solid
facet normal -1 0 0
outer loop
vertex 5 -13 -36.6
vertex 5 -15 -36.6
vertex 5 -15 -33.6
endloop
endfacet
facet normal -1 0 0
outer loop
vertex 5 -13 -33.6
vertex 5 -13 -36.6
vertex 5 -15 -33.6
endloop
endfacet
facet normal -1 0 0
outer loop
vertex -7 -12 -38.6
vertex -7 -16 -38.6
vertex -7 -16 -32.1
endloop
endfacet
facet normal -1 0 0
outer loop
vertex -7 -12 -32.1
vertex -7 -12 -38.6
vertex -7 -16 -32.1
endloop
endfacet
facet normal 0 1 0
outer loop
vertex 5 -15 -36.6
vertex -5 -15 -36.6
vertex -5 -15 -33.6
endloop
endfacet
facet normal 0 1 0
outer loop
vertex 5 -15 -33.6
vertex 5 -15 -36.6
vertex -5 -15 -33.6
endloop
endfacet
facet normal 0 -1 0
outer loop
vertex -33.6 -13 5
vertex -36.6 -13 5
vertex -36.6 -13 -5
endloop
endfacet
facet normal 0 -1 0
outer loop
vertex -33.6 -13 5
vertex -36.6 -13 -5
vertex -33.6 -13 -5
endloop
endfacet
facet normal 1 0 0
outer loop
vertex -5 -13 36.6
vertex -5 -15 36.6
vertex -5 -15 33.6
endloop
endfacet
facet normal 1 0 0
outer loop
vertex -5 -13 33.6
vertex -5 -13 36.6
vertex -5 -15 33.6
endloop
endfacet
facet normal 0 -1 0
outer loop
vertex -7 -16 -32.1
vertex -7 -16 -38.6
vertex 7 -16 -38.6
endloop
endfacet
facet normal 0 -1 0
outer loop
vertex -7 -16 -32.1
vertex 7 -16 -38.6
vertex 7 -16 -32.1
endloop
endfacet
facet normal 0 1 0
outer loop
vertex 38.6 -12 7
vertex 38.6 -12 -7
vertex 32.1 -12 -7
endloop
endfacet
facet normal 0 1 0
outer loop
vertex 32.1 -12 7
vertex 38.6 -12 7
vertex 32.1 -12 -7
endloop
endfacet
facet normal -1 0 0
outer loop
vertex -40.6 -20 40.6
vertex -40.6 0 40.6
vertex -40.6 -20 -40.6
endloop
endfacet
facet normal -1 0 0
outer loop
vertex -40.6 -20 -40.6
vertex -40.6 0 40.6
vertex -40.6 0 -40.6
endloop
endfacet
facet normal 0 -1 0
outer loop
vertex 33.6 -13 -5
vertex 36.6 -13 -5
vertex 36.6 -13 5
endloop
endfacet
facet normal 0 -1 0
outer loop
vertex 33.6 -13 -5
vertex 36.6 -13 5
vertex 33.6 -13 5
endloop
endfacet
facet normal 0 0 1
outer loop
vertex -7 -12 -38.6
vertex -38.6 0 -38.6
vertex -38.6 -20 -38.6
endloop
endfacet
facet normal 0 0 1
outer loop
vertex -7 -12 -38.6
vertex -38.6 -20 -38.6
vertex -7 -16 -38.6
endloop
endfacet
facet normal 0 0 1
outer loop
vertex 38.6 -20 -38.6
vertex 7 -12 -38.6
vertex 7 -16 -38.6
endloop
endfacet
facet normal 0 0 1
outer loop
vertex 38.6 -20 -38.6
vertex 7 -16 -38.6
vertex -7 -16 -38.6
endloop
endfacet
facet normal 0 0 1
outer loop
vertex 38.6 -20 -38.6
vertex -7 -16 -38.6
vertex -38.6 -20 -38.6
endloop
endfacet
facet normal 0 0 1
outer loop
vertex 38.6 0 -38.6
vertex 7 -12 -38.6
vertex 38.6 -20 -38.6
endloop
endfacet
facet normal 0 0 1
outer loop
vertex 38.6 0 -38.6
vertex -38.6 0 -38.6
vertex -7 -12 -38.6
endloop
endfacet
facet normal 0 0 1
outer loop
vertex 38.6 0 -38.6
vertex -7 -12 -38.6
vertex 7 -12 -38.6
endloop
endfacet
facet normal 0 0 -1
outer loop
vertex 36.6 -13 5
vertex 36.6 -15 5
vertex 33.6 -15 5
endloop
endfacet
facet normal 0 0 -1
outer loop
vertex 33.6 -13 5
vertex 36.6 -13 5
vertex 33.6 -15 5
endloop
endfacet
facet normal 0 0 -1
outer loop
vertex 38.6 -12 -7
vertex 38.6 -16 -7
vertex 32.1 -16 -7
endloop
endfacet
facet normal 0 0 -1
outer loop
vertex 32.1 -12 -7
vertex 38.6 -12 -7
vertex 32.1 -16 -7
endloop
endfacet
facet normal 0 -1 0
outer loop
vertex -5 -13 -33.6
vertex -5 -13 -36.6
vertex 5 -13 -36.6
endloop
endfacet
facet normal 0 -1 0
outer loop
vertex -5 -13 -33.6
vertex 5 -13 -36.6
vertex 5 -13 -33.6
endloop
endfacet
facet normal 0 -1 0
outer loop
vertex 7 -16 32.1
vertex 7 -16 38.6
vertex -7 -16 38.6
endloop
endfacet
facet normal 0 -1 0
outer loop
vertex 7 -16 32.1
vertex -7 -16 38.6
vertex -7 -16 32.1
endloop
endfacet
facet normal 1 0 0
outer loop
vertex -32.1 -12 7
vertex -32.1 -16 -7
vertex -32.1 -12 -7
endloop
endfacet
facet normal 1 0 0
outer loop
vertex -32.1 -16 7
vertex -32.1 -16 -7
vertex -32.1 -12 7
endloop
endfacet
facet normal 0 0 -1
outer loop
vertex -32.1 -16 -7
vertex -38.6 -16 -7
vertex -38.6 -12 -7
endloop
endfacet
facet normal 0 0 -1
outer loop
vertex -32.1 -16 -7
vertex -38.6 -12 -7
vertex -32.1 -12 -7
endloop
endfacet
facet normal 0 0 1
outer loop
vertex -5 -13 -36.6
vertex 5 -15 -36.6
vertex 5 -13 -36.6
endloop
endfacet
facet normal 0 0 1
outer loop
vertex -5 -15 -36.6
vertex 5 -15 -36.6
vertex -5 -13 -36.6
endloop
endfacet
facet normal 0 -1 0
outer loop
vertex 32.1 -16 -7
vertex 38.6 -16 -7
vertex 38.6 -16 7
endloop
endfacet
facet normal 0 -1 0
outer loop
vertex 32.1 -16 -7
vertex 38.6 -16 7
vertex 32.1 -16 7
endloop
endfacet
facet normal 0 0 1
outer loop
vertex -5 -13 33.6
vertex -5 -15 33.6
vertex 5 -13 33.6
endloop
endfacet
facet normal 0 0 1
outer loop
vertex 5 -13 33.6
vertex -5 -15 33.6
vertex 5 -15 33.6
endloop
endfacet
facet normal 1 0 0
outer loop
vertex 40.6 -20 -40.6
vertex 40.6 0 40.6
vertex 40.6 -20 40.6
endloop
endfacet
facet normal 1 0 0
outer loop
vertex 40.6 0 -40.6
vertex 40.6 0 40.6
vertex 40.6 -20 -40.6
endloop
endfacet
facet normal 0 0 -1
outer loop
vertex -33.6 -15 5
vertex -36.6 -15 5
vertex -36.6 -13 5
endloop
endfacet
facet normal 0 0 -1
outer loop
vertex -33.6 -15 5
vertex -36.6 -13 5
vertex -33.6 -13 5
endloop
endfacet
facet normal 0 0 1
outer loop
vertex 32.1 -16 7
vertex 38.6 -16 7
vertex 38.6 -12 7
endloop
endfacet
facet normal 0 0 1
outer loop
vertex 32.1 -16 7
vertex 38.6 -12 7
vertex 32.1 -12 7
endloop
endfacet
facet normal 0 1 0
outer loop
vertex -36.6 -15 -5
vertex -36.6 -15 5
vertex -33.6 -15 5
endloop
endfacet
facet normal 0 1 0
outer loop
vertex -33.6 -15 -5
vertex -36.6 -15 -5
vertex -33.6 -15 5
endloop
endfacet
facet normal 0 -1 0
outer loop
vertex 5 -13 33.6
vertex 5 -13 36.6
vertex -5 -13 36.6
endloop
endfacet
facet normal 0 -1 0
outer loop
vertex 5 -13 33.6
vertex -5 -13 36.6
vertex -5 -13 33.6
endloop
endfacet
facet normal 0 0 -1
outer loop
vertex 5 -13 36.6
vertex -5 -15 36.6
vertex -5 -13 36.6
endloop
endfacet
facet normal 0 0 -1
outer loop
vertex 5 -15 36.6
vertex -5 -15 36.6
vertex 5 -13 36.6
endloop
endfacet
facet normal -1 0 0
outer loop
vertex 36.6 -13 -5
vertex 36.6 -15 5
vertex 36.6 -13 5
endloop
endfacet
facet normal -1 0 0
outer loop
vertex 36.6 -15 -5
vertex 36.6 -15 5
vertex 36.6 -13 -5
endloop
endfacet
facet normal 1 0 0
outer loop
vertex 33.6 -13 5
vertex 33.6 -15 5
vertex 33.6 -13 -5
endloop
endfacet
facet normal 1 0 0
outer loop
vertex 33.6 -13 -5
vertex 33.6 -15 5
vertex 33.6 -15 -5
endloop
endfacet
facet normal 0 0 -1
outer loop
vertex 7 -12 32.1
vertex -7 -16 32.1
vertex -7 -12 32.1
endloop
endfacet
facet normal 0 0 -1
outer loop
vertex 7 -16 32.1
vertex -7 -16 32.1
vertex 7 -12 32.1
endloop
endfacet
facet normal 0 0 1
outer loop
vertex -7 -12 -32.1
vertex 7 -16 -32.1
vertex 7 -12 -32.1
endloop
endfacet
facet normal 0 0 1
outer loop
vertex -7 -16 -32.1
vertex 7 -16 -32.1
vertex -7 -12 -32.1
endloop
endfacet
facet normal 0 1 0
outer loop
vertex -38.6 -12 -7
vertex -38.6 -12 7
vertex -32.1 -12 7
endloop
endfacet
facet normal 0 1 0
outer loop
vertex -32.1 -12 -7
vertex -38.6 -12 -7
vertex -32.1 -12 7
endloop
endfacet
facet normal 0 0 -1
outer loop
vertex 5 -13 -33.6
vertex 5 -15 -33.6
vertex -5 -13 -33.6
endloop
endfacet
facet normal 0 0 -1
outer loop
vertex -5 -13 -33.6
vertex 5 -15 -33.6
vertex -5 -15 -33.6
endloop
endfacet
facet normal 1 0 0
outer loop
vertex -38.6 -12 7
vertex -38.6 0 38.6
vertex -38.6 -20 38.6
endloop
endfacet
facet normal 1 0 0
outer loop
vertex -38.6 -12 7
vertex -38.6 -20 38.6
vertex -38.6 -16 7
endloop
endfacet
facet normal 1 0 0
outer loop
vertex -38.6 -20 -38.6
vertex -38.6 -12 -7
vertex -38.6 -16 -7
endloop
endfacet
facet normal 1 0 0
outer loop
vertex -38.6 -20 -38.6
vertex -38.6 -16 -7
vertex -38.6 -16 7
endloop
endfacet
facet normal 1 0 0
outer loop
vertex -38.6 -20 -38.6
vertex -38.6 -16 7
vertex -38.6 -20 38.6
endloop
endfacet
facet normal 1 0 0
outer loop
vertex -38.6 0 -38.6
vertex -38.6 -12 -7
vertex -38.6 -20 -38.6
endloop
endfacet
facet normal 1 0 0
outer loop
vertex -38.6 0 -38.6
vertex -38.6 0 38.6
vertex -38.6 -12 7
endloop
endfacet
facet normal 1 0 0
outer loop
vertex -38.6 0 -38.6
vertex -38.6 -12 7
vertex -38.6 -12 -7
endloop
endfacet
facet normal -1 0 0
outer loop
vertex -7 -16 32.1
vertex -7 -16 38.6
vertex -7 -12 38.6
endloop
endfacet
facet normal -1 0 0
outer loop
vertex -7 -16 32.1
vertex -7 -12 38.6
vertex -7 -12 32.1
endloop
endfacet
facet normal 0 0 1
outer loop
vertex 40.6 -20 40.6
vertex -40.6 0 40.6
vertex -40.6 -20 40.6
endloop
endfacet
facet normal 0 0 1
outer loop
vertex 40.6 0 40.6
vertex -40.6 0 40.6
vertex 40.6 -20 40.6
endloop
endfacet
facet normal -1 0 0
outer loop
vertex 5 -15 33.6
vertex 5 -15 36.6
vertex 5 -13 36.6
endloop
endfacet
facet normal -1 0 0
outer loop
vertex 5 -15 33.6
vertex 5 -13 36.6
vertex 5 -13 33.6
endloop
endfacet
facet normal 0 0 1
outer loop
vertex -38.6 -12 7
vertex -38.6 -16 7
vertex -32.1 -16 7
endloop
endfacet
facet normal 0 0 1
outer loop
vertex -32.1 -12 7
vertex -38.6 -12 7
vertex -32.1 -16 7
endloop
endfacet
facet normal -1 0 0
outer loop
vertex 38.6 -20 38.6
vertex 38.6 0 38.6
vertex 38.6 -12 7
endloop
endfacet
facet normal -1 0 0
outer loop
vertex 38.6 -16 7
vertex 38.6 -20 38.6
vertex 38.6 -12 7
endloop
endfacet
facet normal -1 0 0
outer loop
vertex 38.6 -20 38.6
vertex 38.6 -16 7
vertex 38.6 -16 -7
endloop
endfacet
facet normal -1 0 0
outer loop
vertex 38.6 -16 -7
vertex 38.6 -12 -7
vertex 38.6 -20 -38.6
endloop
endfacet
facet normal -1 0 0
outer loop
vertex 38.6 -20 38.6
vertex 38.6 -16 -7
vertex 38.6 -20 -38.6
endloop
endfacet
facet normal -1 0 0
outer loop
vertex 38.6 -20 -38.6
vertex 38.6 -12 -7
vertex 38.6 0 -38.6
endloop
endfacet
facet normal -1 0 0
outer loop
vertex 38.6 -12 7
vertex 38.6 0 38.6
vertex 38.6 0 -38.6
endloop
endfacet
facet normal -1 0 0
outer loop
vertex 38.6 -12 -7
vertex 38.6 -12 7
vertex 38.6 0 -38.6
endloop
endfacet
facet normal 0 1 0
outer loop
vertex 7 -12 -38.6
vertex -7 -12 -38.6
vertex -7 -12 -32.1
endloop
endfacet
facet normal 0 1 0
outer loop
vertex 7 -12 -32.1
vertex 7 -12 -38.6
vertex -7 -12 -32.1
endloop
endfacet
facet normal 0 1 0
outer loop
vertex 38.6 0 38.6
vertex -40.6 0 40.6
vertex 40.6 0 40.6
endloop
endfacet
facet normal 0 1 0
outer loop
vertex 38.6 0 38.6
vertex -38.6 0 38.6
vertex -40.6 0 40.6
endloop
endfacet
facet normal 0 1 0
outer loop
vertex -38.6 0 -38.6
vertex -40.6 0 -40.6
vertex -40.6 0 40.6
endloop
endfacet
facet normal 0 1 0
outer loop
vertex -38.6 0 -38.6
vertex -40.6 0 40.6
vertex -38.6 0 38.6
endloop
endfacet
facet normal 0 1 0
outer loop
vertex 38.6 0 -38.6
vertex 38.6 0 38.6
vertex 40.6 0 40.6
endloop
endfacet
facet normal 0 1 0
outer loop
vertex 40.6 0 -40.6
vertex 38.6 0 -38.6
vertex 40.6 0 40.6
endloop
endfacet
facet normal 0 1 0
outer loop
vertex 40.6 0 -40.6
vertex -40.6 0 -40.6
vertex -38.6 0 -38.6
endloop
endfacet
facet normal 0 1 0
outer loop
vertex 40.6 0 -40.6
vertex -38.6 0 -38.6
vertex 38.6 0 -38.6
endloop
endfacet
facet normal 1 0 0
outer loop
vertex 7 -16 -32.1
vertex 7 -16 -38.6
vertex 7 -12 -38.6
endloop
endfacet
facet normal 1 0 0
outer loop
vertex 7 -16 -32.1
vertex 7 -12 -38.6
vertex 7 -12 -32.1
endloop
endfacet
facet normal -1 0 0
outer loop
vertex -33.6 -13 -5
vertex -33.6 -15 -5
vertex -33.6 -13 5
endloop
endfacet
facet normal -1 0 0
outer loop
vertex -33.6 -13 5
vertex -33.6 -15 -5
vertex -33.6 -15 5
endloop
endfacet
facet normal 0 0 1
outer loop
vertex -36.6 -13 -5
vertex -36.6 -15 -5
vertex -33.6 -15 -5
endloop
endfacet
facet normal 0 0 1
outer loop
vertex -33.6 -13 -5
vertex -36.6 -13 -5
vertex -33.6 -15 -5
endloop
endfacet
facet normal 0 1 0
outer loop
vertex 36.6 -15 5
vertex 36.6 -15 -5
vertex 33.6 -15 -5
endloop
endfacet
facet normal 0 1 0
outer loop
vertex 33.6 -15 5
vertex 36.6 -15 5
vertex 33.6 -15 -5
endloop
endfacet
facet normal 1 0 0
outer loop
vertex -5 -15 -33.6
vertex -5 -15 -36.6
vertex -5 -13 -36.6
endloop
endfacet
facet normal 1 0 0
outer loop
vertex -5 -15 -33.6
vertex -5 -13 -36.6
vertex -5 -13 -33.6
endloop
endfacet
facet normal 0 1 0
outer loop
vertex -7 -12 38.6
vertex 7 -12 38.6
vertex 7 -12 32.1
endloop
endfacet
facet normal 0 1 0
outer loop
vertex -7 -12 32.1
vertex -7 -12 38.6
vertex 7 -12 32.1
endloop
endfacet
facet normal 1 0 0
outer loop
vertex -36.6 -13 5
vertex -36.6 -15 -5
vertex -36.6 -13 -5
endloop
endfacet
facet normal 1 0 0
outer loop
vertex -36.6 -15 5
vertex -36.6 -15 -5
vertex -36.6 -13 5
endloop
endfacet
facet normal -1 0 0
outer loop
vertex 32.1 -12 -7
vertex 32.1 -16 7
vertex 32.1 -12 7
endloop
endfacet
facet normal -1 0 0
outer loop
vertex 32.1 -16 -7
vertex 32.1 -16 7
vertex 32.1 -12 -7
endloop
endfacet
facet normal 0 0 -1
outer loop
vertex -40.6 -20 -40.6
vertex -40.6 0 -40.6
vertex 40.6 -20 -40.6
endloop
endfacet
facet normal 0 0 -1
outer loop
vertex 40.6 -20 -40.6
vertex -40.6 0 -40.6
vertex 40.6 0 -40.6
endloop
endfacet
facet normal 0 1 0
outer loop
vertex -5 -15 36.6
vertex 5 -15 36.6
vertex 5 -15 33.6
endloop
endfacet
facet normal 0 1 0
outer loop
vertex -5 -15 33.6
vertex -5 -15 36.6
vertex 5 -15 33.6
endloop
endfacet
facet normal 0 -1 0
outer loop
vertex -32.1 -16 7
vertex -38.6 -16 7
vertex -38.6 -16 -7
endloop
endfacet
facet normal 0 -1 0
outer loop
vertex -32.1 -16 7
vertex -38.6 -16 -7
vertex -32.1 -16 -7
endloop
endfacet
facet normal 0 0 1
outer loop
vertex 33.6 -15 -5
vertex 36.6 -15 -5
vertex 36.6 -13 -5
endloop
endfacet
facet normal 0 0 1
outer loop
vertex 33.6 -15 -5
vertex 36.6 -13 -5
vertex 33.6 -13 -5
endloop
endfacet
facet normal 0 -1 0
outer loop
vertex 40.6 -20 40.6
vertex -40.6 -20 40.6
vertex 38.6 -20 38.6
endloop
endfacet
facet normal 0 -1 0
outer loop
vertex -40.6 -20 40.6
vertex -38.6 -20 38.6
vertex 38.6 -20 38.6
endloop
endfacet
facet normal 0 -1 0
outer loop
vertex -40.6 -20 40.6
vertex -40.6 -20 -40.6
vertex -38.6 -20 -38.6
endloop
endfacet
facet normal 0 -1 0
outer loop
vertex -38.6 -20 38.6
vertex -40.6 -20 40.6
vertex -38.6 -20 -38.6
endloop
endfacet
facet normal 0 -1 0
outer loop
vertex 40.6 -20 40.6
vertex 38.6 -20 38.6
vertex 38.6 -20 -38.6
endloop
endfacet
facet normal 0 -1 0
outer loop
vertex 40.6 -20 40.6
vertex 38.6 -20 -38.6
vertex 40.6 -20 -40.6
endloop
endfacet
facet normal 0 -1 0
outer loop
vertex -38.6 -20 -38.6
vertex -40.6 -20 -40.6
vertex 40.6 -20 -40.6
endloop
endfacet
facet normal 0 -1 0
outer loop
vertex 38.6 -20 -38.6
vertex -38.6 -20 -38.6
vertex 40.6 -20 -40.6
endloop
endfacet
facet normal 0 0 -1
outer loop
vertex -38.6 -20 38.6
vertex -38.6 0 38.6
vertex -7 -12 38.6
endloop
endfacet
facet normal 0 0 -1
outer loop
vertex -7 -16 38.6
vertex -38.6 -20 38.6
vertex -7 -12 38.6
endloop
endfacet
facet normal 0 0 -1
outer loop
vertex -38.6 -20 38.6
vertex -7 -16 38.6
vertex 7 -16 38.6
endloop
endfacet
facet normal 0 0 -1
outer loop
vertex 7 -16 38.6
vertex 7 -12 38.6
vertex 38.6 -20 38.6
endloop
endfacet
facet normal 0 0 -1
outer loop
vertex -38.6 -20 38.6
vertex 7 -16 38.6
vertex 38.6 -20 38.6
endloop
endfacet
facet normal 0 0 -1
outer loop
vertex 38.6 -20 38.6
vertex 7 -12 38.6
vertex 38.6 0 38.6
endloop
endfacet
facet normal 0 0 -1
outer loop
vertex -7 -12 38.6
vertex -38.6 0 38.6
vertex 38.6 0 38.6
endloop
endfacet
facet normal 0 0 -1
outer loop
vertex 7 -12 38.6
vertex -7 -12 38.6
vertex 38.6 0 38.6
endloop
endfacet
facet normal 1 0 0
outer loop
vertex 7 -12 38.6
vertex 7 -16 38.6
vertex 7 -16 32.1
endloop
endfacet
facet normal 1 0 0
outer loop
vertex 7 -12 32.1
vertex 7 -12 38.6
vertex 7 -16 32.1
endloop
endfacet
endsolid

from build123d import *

# Parameters (mm, degrees)
SKETCH4_W           = 81.2
SKETCH4_H           = 81.2
SKETCH4_W_2         = 77.2
SKETCH4_H_2         = 77.2
BOSS_EXTRUDE1_DEPTH = 20
BOSS_EXTRUDE2_START = -4
SKETCH5_W           = 6.5
SKETCH5_H           = 14
BOSS_EXTRUDE2_DEPTH = 4
CUT_EXTRUDE2_START  = -5
SKETCH5_3_W         = 3
SKETCH5_3_H         = 10
CUT_EXTRUDE2_DEPTH  = 2
CIRPATTERN2_COUNT   = 4


with BuildPart() as part:
    # Sketch4 → Boss-Extrude1 (new body)
    with BuildSketch(Plane(origin=(0, 0, 0), x_dir=(1, 0, 0), z_dir=(0, 1, 0))):
        Rectangle(SKETCH4_W, SKETCH4_H)
        Rectangle(SKETCH4_W_2, SKETCH4_H_2, mode=Mode.SUBTRACT)
    extrude(amount=-BOSS_EXTRUDE1_DEPTH)

    # Sketch5 → Boss-Extrude2 (add)
    with BuildSketch(Plane.XZ.offset(20).offset(BOSS_EXTRUDE2_START)):
        with Locations((-35.35, 0)):
            Rectangle(SKETCH5_W, SKETCH5_H)
    boss_extrude2 = extrude(amount=-BOSS_EXTRUDE2_DEPTH)

    # Sketch5<3> → Cut-Extrude2 (cut)
    with BuildSketch(Plane.XZ.offset(20).offset(CUT_EXTRUDE2_START)):
        with Locations((-35.1, 0)):
            Rectangle(SKETCH5_3_W, SKETCH5_3_H)
    cut_extrude2 = extrude(amount=-CUT_EXTRUDE2_DEPTH, mode=Mode.SUBTRACT)

    # CirPattern2: Boss-Extrude2, Cut-Extrude2 ×4 about axis
    cirpattern2_axis = Axis((0, 0, 0), (0, -1, 0))
    add([boss_extrude2.rotate(cirpattern2_axis, i * 360 / CIRPATTERN2_COUNT) for i in range(1, CIRPATTERN2_COUNT)])
    add([cut_extrude2.rotate(cirpattern2_axis, i * 360 / CIRPATTERN2_COUNT) for i in range(1, CIRPATTERN2_COUNT)], mode=Mode.SUBTRACT)


solid = part.part
